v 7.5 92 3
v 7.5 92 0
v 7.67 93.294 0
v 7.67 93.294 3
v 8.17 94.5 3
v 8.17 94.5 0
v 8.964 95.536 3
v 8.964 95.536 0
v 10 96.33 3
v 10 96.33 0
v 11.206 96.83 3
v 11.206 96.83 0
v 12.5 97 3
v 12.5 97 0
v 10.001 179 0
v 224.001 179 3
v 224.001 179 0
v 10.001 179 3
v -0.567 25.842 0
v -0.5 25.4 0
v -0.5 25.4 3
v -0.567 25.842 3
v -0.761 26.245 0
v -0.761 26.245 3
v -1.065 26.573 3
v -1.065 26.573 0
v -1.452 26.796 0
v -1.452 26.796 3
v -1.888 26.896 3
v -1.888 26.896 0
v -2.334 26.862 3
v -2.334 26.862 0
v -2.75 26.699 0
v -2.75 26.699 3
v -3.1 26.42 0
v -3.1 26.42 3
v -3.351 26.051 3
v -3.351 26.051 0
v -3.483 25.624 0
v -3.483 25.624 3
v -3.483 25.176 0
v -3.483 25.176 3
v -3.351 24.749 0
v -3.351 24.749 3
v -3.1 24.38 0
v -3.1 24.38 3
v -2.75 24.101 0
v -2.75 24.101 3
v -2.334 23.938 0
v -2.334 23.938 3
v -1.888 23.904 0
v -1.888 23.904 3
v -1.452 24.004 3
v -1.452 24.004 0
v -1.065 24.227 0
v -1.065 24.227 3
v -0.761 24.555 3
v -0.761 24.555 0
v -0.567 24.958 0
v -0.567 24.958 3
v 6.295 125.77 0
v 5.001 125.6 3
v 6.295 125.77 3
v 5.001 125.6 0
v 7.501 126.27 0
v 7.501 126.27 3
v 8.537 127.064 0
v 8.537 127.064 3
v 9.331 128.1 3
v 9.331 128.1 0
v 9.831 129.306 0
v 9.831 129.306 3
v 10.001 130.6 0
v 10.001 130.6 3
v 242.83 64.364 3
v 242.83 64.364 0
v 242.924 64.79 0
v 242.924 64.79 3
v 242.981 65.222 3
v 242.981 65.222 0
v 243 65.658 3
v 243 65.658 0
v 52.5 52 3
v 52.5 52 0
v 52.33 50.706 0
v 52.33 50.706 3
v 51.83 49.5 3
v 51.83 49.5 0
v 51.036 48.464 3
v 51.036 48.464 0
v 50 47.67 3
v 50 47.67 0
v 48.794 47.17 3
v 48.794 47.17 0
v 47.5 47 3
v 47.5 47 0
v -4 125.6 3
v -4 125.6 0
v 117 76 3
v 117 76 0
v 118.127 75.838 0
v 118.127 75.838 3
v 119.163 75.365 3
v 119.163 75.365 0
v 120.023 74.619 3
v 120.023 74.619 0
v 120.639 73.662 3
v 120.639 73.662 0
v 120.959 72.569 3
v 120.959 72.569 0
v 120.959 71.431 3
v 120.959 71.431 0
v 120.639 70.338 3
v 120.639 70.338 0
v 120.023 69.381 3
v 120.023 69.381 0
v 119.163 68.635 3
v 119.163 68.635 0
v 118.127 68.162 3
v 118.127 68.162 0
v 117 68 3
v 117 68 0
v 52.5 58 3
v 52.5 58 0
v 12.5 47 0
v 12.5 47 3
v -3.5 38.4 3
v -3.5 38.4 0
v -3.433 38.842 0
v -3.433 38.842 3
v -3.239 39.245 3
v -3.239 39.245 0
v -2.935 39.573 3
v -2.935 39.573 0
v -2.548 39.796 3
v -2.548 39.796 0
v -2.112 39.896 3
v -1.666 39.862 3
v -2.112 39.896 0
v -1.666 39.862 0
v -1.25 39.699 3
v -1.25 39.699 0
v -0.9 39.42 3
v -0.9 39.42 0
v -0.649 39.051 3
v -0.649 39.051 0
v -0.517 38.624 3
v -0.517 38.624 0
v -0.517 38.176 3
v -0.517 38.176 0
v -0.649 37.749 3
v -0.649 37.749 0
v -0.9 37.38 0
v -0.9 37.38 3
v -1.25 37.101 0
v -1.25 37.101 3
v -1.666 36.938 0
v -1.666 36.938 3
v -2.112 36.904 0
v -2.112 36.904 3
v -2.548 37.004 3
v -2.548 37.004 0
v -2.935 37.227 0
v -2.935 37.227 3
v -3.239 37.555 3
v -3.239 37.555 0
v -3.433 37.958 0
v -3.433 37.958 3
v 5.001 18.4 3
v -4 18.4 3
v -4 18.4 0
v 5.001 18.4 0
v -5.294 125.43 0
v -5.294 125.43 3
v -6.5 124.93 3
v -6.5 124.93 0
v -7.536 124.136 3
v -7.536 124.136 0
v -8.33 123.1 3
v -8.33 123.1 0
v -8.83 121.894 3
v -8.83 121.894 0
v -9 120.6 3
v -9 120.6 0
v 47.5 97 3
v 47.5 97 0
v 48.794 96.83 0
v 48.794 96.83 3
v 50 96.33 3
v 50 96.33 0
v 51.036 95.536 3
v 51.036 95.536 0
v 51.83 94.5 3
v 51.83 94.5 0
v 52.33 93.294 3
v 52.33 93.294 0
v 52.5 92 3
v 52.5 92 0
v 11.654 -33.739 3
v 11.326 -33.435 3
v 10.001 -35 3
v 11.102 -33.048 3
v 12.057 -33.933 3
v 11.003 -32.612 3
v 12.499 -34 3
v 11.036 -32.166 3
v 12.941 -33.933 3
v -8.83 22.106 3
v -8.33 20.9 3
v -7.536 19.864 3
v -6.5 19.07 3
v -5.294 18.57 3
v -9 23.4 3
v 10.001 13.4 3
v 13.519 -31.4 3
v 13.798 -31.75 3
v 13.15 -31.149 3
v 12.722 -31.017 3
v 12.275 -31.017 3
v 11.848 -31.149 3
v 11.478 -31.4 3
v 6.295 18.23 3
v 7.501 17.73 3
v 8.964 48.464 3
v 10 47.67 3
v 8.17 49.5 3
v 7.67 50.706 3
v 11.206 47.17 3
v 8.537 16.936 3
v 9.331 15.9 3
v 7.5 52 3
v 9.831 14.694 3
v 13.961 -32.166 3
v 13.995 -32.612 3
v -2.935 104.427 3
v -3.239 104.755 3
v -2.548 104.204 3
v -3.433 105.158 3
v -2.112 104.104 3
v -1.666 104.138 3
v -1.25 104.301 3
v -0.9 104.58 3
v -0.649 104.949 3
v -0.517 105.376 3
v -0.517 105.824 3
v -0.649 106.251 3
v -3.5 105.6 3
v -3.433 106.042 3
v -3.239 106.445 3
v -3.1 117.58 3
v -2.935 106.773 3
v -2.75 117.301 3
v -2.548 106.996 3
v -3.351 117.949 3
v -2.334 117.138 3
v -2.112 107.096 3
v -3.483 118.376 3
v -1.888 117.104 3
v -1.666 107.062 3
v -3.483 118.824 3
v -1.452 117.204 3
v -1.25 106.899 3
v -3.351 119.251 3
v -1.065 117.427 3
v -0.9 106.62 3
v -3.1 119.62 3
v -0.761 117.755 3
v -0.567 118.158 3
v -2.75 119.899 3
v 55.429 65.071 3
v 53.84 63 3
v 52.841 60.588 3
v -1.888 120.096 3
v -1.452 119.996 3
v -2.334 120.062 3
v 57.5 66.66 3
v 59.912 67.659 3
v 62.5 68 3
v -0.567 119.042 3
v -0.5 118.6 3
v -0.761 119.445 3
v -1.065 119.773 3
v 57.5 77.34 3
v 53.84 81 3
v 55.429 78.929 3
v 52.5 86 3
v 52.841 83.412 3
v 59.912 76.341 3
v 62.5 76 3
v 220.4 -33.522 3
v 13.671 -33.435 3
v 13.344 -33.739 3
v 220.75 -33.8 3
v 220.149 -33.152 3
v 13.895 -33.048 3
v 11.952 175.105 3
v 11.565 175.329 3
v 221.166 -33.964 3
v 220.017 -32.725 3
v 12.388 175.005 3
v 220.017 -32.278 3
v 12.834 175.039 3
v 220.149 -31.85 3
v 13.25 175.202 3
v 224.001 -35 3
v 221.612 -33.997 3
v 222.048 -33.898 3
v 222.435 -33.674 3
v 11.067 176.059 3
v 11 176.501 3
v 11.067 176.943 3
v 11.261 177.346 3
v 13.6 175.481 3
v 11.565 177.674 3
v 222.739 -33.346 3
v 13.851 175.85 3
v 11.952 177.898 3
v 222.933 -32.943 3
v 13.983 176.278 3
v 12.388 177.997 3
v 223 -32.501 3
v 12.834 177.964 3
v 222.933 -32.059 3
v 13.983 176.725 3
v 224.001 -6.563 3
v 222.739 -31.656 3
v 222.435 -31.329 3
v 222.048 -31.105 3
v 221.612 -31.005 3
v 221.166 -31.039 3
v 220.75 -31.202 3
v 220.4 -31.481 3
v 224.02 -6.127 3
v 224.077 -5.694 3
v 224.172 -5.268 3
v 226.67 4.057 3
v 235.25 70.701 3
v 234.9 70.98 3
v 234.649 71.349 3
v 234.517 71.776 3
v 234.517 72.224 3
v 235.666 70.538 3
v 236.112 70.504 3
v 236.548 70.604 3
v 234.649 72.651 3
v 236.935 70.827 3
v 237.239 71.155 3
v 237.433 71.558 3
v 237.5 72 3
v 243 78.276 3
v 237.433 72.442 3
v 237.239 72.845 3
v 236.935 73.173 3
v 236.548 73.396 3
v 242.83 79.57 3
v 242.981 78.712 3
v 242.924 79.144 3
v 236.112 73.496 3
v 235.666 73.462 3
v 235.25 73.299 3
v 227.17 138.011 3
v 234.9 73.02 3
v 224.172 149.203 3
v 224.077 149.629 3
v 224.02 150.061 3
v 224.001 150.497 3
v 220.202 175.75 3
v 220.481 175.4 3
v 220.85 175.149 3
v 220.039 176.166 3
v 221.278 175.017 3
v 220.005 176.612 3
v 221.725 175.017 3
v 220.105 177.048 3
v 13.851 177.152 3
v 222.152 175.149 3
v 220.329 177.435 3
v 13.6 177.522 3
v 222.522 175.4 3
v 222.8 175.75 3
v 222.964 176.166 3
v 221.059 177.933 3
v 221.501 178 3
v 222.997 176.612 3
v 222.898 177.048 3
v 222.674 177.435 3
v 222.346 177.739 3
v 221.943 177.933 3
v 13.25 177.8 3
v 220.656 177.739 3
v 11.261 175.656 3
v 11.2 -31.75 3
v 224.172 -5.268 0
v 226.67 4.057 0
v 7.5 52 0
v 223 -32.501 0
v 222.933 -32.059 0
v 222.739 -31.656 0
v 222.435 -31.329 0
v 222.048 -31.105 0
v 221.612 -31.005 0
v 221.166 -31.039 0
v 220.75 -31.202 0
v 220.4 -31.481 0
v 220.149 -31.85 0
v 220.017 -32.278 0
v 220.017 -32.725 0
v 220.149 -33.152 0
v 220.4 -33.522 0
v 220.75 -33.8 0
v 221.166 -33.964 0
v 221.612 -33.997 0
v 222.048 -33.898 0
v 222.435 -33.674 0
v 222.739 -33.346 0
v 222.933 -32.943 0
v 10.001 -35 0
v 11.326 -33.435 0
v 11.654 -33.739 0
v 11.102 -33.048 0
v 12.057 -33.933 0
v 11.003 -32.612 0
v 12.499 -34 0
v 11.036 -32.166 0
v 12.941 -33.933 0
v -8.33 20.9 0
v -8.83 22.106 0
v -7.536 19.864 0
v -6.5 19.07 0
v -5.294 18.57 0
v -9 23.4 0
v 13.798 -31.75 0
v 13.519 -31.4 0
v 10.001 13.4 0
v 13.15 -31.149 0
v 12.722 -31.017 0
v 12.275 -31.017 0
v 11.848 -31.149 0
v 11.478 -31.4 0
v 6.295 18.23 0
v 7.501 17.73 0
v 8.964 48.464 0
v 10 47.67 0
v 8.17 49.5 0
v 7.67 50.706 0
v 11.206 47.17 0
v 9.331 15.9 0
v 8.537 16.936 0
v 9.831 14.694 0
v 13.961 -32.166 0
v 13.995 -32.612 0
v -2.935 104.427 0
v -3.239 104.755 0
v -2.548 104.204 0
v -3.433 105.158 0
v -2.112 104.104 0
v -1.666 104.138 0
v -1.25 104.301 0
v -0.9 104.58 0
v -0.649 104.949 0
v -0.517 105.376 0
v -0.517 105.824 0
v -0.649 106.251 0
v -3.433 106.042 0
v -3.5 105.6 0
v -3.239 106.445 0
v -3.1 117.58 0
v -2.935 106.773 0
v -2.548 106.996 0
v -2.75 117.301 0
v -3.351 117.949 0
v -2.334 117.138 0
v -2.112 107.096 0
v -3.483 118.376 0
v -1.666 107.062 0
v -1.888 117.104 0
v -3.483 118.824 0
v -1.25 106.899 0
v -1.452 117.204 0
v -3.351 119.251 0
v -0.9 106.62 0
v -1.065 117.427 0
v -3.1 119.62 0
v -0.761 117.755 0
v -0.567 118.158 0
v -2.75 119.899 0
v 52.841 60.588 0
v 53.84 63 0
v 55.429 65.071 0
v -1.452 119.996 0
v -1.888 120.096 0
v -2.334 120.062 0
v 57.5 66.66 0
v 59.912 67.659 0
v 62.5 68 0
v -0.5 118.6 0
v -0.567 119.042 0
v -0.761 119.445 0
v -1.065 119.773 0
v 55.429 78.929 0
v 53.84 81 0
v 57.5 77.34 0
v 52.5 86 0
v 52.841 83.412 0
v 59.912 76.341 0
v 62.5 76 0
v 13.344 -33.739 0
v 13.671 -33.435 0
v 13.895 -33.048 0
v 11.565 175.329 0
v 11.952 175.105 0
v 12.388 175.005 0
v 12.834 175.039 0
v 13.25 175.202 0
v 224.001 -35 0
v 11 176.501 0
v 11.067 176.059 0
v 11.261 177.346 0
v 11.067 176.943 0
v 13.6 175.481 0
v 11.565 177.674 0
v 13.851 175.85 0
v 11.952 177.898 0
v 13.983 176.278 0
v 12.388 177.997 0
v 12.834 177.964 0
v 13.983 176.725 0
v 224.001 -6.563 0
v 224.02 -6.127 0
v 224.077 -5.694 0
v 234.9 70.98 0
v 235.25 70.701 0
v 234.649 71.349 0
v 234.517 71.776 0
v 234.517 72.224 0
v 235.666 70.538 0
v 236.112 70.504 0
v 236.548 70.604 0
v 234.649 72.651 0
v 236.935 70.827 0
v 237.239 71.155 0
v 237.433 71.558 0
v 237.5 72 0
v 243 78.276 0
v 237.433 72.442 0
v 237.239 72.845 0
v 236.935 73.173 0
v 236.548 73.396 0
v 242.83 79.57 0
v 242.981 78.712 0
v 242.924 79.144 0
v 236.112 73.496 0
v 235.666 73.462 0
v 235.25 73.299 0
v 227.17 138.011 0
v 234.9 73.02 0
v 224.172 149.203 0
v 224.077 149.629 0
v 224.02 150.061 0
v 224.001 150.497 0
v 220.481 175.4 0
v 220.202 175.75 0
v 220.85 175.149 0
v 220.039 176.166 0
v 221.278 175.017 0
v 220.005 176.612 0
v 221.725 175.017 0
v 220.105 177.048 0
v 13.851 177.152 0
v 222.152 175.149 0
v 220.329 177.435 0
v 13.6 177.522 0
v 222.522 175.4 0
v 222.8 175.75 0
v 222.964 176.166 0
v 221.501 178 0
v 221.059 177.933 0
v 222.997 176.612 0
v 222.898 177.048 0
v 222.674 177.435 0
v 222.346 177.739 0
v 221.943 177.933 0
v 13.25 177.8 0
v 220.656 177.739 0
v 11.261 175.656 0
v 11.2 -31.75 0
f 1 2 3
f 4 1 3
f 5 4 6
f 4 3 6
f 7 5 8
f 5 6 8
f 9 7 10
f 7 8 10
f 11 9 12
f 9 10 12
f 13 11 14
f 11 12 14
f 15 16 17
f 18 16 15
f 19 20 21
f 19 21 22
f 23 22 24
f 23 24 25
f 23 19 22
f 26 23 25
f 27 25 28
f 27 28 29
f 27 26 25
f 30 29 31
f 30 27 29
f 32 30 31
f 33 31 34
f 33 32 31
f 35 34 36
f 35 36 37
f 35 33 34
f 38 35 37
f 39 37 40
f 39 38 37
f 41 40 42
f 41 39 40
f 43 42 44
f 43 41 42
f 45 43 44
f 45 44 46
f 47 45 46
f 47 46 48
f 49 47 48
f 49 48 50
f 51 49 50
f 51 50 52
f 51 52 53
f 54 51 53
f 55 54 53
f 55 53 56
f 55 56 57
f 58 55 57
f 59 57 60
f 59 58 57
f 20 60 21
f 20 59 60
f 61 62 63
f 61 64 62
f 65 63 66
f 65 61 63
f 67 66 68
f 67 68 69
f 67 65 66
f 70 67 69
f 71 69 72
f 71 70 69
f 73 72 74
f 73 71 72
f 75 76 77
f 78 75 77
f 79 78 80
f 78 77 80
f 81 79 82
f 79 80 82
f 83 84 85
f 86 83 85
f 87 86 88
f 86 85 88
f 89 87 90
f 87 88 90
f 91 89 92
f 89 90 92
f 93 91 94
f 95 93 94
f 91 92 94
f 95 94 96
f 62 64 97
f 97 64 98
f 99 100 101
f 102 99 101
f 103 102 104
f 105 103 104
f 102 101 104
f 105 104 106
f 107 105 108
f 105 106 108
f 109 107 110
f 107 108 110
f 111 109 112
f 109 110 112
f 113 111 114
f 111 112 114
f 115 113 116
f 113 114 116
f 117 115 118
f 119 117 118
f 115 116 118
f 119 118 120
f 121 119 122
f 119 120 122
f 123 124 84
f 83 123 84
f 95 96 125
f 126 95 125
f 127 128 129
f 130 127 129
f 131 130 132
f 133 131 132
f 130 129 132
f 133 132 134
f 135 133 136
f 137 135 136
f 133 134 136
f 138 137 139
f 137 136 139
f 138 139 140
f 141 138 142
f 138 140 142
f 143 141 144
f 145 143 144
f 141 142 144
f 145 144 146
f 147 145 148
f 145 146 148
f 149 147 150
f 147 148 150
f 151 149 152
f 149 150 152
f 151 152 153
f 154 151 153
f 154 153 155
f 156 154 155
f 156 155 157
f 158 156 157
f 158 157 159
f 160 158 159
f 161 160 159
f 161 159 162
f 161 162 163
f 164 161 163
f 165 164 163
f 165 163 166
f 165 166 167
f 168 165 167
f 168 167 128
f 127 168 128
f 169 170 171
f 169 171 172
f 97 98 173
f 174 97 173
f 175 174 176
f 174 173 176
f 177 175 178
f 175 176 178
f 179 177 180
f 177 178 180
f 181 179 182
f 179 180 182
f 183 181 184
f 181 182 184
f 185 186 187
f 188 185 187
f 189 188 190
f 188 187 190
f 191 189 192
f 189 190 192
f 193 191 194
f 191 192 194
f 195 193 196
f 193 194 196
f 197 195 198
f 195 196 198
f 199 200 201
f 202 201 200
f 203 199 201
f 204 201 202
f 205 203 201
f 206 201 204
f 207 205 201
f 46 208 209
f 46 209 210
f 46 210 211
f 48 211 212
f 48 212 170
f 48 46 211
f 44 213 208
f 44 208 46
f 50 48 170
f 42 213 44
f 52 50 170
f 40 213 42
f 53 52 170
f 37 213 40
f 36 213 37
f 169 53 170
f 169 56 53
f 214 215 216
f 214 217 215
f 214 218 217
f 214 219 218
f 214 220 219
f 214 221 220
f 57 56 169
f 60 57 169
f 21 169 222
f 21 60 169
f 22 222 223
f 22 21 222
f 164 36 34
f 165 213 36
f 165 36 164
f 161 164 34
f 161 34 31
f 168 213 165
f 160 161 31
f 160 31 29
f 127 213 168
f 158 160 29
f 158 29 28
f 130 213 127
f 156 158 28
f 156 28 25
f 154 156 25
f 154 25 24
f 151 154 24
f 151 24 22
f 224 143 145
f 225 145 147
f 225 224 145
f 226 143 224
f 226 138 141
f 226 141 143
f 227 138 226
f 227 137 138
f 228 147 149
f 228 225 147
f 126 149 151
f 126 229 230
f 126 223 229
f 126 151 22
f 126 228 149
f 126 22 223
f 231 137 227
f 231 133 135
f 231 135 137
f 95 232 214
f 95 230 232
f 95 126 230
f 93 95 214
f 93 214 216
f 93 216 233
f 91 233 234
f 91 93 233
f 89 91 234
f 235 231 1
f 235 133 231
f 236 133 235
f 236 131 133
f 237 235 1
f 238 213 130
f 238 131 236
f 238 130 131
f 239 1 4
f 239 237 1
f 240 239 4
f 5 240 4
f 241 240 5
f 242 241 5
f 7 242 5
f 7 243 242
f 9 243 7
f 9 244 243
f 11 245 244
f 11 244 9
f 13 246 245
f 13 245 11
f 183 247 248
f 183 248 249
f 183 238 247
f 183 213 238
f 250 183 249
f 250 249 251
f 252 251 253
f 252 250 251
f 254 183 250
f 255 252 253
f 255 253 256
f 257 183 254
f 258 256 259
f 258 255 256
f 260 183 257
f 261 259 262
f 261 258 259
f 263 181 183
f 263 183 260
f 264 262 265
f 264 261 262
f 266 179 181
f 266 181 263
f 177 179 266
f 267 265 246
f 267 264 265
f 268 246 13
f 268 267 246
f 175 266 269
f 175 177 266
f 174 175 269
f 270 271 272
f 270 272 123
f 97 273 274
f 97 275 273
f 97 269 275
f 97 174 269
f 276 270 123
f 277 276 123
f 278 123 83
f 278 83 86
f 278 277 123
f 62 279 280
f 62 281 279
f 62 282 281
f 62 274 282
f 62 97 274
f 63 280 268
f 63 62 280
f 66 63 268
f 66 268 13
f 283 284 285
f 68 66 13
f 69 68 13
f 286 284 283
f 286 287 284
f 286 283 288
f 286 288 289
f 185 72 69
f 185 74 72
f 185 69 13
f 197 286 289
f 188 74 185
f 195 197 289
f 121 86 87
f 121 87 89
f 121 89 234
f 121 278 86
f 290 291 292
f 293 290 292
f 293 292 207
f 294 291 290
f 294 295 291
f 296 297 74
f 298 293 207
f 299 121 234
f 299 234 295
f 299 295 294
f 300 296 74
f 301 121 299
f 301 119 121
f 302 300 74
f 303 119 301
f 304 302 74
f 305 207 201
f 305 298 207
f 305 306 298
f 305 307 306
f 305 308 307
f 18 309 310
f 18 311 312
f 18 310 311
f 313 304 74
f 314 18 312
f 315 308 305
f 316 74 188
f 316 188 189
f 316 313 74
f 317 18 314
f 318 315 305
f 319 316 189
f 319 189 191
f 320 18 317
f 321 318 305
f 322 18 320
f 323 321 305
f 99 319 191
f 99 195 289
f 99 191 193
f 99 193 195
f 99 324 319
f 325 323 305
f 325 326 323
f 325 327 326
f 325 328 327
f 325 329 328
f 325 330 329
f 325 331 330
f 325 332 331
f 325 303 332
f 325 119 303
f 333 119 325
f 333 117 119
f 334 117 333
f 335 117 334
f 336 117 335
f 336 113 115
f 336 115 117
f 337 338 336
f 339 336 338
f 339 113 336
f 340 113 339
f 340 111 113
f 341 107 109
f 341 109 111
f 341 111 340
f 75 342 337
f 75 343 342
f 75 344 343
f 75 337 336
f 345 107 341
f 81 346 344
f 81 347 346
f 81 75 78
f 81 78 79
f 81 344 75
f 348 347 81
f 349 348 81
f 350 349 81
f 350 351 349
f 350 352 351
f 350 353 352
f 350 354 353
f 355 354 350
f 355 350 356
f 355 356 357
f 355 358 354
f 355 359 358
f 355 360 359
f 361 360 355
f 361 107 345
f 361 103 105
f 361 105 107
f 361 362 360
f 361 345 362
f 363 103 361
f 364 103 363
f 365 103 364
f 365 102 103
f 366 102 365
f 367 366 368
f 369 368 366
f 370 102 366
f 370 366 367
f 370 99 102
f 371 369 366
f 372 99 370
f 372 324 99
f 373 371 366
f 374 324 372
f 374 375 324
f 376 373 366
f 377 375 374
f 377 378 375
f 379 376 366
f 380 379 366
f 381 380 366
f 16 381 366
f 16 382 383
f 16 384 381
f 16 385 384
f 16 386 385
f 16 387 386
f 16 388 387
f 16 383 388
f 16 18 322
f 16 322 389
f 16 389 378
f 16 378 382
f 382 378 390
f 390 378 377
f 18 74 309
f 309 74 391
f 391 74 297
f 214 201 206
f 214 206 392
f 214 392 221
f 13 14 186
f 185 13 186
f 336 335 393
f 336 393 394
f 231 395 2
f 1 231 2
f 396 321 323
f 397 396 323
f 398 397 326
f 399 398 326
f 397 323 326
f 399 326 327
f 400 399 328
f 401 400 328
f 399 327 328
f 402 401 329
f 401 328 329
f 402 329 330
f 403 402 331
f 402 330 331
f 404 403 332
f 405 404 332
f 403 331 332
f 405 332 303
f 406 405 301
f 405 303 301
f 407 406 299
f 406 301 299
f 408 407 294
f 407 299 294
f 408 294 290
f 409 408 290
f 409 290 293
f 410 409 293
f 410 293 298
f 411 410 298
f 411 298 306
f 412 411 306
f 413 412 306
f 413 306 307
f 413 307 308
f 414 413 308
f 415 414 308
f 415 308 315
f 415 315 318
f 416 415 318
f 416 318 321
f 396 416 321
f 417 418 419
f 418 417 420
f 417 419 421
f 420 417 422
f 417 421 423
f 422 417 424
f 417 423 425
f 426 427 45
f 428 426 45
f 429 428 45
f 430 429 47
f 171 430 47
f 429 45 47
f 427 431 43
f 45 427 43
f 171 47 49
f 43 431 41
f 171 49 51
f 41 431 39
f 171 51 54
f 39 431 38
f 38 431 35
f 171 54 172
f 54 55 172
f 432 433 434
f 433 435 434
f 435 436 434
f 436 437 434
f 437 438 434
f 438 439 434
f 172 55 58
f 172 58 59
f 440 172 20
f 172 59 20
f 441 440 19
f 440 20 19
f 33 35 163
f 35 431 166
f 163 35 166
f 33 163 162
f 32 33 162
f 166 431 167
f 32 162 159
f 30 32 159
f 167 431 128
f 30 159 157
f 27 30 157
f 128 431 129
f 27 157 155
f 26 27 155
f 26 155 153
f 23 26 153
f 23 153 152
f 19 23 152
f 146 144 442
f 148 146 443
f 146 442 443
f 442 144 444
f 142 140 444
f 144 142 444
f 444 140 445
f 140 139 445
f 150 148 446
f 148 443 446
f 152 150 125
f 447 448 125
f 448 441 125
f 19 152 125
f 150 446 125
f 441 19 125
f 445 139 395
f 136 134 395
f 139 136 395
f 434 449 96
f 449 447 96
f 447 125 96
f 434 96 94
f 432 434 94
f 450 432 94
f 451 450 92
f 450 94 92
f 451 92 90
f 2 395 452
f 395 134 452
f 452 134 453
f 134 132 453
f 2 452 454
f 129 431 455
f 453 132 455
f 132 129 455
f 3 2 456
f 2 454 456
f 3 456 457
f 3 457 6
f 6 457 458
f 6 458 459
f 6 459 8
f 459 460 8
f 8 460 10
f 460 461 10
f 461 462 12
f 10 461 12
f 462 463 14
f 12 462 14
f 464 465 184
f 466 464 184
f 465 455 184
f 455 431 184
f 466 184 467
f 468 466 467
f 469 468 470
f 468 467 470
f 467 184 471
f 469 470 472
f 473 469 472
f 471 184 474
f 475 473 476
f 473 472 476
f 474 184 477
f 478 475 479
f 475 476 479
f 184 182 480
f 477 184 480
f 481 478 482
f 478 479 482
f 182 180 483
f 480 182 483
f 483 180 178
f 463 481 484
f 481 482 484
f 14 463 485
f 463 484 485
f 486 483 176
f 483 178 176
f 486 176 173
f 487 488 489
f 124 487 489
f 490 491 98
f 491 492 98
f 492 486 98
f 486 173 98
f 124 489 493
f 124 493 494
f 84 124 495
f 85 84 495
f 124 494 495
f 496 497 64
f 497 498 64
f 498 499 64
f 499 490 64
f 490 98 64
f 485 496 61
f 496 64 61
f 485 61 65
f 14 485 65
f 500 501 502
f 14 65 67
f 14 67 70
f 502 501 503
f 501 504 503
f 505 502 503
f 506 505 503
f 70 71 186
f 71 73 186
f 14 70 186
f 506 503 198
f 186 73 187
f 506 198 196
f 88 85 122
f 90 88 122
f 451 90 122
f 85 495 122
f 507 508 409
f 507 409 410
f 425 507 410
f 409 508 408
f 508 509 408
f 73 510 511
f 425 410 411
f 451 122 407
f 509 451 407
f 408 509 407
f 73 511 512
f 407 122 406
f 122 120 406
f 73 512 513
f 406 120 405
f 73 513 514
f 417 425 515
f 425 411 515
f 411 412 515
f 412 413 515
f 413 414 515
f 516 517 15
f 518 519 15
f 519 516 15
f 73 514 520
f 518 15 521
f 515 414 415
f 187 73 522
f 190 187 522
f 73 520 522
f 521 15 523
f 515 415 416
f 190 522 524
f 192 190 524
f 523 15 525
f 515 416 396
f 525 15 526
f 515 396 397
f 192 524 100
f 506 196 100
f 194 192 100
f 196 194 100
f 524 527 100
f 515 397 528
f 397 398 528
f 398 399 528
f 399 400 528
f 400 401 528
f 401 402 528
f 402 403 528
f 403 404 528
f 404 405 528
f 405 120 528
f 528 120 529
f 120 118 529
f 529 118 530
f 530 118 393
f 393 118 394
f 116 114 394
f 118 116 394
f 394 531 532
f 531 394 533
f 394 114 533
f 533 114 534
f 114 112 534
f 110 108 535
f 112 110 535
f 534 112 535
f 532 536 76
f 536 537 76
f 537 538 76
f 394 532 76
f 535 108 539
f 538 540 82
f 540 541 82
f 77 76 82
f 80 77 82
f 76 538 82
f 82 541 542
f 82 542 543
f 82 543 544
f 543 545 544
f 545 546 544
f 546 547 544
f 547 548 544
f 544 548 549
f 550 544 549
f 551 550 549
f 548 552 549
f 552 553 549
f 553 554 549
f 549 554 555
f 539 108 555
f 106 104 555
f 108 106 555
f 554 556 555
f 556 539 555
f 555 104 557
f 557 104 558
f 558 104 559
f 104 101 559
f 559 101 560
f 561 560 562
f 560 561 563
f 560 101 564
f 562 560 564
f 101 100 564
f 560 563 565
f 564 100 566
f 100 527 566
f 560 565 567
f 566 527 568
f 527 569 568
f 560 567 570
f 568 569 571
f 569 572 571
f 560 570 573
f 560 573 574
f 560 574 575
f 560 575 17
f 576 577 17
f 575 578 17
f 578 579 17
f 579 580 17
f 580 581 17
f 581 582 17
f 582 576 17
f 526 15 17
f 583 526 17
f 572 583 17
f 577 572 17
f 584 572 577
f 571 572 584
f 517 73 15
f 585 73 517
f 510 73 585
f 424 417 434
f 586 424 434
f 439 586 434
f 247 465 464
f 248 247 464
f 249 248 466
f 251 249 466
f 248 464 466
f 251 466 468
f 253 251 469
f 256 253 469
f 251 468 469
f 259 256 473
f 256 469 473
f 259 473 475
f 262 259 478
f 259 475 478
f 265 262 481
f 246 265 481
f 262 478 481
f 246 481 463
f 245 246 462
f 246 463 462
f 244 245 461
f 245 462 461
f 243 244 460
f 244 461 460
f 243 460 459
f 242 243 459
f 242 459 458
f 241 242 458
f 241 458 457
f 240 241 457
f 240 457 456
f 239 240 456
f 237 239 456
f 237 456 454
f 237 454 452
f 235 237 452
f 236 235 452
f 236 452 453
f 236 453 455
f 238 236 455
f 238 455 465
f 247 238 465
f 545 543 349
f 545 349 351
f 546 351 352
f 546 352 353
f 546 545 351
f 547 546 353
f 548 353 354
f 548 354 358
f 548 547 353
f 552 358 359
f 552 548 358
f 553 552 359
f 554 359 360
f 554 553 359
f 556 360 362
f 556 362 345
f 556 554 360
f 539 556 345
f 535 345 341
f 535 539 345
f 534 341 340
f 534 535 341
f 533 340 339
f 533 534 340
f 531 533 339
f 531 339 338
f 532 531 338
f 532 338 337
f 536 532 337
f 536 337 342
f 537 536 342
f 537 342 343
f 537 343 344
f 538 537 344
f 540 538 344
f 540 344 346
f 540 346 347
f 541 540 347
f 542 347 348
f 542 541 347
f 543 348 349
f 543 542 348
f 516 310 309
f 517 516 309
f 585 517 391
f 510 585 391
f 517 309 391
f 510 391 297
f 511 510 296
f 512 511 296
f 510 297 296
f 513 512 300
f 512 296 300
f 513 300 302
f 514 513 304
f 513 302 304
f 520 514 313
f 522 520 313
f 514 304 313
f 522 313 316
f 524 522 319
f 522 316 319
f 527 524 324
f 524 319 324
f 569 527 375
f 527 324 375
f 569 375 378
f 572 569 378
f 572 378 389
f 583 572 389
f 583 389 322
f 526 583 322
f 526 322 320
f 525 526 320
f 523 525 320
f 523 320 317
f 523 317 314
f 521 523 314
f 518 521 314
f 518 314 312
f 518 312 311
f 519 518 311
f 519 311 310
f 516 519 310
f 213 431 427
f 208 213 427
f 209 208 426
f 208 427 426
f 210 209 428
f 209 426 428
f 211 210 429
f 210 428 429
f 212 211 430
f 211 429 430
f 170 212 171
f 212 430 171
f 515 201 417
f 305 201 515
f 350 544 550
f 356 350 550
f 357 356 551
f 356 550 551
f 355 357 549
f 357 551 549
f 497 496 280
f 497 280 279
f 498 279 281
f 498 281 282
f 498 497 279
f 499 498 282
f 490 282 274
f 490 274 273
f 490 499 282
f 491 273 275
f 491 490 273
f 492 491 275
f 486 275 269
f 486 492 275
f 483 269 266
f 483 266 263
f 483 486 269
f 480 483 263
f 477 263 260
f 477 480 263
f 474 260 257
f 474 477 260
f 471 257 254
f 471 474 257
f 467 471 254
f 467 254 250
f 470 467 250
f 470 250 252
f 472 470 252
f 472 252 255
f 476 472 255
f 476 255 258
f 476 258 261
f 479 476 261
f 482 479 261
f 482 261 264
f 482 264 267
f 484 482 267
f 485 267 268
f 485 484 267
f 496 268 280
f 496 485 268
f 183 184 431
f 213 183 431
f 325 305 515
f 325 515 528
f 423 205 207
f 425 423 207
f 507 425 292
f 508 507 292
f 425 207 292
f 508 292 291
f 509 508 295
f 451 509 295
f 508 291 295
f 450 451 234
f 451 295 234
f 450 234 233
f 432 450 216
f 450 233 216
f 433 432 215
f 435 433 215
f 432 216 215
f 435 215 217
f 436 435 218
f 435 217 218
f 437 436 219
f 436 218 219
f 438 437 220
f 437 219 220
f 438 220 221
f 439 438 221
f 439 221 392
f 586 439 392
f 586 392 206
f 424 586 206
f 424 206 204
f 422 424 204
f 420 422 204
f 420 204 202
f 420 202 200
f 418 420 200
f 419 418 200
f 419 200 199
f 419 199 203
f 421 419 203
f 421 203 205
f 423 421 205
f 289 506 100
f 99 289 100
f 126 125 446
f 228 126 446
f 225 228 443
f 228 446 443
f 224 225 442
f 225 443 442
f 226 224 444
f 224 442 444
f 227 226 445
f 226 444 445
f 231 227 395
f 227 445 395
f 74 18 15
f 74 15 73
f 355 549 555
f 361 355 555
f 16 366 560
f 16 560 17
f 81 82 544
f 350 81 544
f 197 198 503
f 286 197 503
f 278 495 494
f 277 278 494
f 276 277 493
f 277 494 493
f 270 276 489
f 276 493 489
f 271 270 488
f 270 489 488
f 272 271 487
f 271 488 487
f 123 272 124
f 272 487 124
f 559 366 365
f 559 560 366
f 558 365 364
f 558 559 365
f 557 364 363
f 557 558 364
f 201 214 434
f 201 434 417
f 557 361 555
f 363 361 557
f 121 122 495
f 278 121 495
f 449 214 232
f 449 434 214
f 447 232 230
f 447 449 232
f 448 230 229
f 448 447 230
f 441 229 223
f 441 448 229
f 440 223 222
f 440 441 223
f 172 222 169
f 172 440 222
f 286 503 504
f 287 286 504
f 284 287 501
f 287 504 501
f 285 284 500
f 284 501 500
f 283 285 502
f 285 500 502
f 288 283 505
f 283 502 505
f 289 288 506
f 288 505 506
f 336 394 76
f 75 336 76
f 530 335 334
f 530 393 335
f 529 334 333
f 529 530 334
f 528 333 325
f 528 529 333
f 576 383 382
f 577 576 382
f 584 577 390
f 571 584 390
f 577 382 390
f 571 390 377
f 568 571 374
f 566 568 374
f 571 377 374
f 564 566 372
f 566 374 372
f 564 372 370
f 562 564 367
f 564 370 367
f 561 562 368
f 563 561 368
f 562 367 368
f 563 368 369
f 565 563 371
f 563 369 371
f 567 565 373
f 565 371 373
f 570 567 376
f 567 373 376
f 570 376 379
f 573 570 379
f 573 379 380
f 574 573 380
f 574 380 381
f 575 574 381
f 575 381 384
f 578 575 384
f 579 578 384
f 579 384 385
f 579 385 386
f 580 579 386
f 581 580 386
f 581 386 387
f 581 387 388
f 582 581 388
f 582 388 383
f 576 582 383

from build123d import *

# Parameters (mm, degrees)
BOSS_EXTRUDE1_OUTLINE_R = 1.5
BOSS_EXTRUDE1_DEPTH     = 3
SKETCH1_R               = 1.5
CUT_EXTRUDE1_DEPTH      = 10
CIRPATTERN1_COUNT       = 4
SKETCH3_W               = 736.909485963
SKETCH3_H               = 680.360125743
CUT_EXTRUDE2_DEPTH      = 304.313928241
FILLET2_R               = 5
FILLET3_R               = 5
SKETCH4_R               = 1.5
CUT_EXTRUDE3_DEPTH      = 10


# Read off the part's stored shape, not the designer's step: Boss-Extrude1
with BuildPart() as part:
    # Boss-Extrude1 outline → Boss-Extrude1 (new body)
    with BuildSketch(Plane.XY):
        with BuildLine():
            ThreePointArc((227.170370868, 138.011217036), (227.042775693, 138.652681301), (227, 139.305312262))
            Line((227, 139.305312262), (227, 176.497490519))
            ThreePointArc((227, 176.497490519), (225.535533906, 180.033024425), (222, 181.497490519))
            Line((222, 181.497490519), (12.343347406, 181.497486855))
            ThreePointArc((12.343347406, 181.497486855), (8.909508183, 179.979649569), (7.5, 176.499941461))
            Line((7.5, 176.499941461), (7.5, 130.6))
            ThreePointArc((7.5, 130.6), (6.035533906, 127.064466094), (2.5, 125.6))
            Line((2.5, 125.6), (-4, 125.6))
            ThreePointArc((-4, 125.6), (-7.535533906, 124.135533906), (-9, 120.6))
            Line((-9, 120.6), (-9, 23.4))
            ThreePointArc((-9, 23.4), (-7.535533906, 19.864466094), (-4, 18.4))
            Line((-4, 18.4), (2.5, 18.4))
            ThreePointArc((2.5, 18.4), (6.035533906, 16.935533906), (7.5, 13.4))
            Line((7.5, 13.4), (7.5, -32.5))
            ThreePointArc((7.5, -32.5), (8.964466094, -36.035533906), (12.5, -37.5))
            Line((12.5, -37.5), (221.5, -37.5))
            ThreePointArc((221.5, -37.5), (225.035533906, -36.035533906), (226.5, -32.5))
            Line((226.5, -32.5), (226.5, 2.762899187))
            ThreePointArc((226.5, 2.762899187), (226.542775693, 3.415530148), (226.670370869, 4.056994413))
            Line((226.670370869, 4.056994413), (242.829629131, 64.364167262))
            ThreePointArc((242.829629131, 64.364167262), (242.957224307, 65.005631527), (243, 65.658262488))
            Line((243, 65.658262488), (243, 78.275974364))
            ThreePointArc((243, 78.275974364), (242.957224307, 78.928605325), (242.829629131, 79.570069589))
            Line((242.829629131, 79.570069589), (227.170370868, 138.011217036))
        make_face()
        with Locations((-2, 25.4)):
            Circle(BOSS_EXTRUDE1_OUTLINE_R, mode=Mode.SUBTRACT)
        with Locations((-2, 118.6)):
            Circle(BOSS_EXTRUDE1_OUTLINE_R, mode=Mode.SUBTRACT)
        with BuildLine():
            ThreePointArc((62.5, 68), (55.428932188, 65.071067812), (52.5, 58))
            Line((52.5, 58), (52.5, 52))
            ThreePointArc((52.5, 52), (51.035533906, 48.464466094), (47.5, 47))
            Line((47.5, 47), (12.5, 47))
            ThreePointArc((12.5, 47), (8.964466094, 48.464466094), (7.5, 52))
            Line((7.5, 52), (7.5, 92))
            ThreePointArc((7.5, 92), (8.964466094, 95.535533906), (12.5, 97))
            Line((12.5, 97), (47.5, 97))
            ThreePointArc((47.5, 97), (51.035533906, 95.535533906), (52.5, 92))
            Line((52.5, 92), (52.5, 86))
            ThreePointArc((52.5, 86), (55.428932188, 78.928932188), (62.5, 76))
            Line((62.5, 76), (117, 76))
            ThreePointArc((117, 76), (121, 72), (117, 68))
            Line((117, 68), (62.5, 68))
        make_face(mode=Mode.SUBTRACT)
        with Locations((236, 72)):
            Circle(BOSS_EXTRUDE1_OUTLINE_R, mode=Mode.SUBTRACT)
    extrude(amount=BOSS_EXTRUDE1_DEPTH)

    # Sketch1 → Cut-Extrude1 (cut)
    with BuildSketch(Plane.XY.offset(3)):
        with Locations((221.5, -32.501254741)):
            Circle(SKETCH1_R)
    cut_extrude1 = extrude(amount=-CUT_EXTRUDE1_DEPTH, mode=Mode.SUBTRACT)

    # CirPattern1: Cut-Extrude1 ×4 about axis
    cirpattern1_axis = Axis((117, 72, 0), (0, 0, 1))
    for i in range(1, CIRPATTERN1_COUNT):
        add(cut_extrude1.rotate(cirpattern1_axis, i * 360 / CIRPATTERN1_COUNT), mode=Mode.SUBTRACT)

    # Sketch3 → Cut-Extrude2 (cut, through all)
    with BuildSketch(Plane.XY.offset(3)):
        with Locations((306.942195916, -80.480880195)):
            Rectangle(SKETCH3_W, SKETCH3_H)
        Polygon((-4, 18.4), (10.001254741, 18.4), (10.001254741, -35), (224.001254741, -35), (224.001254741, -5.904282588), (241.995428238, 61.250887144), (247.405063047, 62.49431775), (224.001254741, 149.838519439), (224.001254741, 179), (10.001254741, 179), (10.001254741, 125.6), (-4, 125.6), (-27.04848394, 125.6), (-22.601157645, 14.939042157), align=None, mode=Mode.SUBTRACT)
    extrude(amount=-CUT_EXTRUDE2_DEPTH, mode=Mode.SUBTRACT)

    # Fillet2
    fillet2_edges = [part.edges().sort_by_distance(p)[0] for p in [
        (10.001254741, 125.6, 1.5),
        (10.001254741, 18.4, 1.5),
    ]]
    fillet(fillet2_edges, radius=FILLET2_R)

    # Fillet3
    fillet3_edges = [part.edges().sort_by_distance(p)[0] for p in [
        (224.001254741, -5.904282588, 1.5),
        (224.001254741, 149.838519439, 1.5),
    ]]
    fillet(fillet3_edges, radius=FILLET3_R)

    # Sketch4 → Cut-Extrude3 (cut)
    with BuildSketch(Plane(origin=(0, 0, 0), x_dir=(-1, 0, 0), z_dir=(0, 0, -1))):
        with Locations((2, 105.6)):
            Circle(SKETCH4_R)
        with Locations((2, 38.4)):
            Circle(SKETCH4_R)
    extrude(amount=-CUT_EXTRUDE3_DEPTH, mode=Mode.SUBTRACT)


solid = part.part
